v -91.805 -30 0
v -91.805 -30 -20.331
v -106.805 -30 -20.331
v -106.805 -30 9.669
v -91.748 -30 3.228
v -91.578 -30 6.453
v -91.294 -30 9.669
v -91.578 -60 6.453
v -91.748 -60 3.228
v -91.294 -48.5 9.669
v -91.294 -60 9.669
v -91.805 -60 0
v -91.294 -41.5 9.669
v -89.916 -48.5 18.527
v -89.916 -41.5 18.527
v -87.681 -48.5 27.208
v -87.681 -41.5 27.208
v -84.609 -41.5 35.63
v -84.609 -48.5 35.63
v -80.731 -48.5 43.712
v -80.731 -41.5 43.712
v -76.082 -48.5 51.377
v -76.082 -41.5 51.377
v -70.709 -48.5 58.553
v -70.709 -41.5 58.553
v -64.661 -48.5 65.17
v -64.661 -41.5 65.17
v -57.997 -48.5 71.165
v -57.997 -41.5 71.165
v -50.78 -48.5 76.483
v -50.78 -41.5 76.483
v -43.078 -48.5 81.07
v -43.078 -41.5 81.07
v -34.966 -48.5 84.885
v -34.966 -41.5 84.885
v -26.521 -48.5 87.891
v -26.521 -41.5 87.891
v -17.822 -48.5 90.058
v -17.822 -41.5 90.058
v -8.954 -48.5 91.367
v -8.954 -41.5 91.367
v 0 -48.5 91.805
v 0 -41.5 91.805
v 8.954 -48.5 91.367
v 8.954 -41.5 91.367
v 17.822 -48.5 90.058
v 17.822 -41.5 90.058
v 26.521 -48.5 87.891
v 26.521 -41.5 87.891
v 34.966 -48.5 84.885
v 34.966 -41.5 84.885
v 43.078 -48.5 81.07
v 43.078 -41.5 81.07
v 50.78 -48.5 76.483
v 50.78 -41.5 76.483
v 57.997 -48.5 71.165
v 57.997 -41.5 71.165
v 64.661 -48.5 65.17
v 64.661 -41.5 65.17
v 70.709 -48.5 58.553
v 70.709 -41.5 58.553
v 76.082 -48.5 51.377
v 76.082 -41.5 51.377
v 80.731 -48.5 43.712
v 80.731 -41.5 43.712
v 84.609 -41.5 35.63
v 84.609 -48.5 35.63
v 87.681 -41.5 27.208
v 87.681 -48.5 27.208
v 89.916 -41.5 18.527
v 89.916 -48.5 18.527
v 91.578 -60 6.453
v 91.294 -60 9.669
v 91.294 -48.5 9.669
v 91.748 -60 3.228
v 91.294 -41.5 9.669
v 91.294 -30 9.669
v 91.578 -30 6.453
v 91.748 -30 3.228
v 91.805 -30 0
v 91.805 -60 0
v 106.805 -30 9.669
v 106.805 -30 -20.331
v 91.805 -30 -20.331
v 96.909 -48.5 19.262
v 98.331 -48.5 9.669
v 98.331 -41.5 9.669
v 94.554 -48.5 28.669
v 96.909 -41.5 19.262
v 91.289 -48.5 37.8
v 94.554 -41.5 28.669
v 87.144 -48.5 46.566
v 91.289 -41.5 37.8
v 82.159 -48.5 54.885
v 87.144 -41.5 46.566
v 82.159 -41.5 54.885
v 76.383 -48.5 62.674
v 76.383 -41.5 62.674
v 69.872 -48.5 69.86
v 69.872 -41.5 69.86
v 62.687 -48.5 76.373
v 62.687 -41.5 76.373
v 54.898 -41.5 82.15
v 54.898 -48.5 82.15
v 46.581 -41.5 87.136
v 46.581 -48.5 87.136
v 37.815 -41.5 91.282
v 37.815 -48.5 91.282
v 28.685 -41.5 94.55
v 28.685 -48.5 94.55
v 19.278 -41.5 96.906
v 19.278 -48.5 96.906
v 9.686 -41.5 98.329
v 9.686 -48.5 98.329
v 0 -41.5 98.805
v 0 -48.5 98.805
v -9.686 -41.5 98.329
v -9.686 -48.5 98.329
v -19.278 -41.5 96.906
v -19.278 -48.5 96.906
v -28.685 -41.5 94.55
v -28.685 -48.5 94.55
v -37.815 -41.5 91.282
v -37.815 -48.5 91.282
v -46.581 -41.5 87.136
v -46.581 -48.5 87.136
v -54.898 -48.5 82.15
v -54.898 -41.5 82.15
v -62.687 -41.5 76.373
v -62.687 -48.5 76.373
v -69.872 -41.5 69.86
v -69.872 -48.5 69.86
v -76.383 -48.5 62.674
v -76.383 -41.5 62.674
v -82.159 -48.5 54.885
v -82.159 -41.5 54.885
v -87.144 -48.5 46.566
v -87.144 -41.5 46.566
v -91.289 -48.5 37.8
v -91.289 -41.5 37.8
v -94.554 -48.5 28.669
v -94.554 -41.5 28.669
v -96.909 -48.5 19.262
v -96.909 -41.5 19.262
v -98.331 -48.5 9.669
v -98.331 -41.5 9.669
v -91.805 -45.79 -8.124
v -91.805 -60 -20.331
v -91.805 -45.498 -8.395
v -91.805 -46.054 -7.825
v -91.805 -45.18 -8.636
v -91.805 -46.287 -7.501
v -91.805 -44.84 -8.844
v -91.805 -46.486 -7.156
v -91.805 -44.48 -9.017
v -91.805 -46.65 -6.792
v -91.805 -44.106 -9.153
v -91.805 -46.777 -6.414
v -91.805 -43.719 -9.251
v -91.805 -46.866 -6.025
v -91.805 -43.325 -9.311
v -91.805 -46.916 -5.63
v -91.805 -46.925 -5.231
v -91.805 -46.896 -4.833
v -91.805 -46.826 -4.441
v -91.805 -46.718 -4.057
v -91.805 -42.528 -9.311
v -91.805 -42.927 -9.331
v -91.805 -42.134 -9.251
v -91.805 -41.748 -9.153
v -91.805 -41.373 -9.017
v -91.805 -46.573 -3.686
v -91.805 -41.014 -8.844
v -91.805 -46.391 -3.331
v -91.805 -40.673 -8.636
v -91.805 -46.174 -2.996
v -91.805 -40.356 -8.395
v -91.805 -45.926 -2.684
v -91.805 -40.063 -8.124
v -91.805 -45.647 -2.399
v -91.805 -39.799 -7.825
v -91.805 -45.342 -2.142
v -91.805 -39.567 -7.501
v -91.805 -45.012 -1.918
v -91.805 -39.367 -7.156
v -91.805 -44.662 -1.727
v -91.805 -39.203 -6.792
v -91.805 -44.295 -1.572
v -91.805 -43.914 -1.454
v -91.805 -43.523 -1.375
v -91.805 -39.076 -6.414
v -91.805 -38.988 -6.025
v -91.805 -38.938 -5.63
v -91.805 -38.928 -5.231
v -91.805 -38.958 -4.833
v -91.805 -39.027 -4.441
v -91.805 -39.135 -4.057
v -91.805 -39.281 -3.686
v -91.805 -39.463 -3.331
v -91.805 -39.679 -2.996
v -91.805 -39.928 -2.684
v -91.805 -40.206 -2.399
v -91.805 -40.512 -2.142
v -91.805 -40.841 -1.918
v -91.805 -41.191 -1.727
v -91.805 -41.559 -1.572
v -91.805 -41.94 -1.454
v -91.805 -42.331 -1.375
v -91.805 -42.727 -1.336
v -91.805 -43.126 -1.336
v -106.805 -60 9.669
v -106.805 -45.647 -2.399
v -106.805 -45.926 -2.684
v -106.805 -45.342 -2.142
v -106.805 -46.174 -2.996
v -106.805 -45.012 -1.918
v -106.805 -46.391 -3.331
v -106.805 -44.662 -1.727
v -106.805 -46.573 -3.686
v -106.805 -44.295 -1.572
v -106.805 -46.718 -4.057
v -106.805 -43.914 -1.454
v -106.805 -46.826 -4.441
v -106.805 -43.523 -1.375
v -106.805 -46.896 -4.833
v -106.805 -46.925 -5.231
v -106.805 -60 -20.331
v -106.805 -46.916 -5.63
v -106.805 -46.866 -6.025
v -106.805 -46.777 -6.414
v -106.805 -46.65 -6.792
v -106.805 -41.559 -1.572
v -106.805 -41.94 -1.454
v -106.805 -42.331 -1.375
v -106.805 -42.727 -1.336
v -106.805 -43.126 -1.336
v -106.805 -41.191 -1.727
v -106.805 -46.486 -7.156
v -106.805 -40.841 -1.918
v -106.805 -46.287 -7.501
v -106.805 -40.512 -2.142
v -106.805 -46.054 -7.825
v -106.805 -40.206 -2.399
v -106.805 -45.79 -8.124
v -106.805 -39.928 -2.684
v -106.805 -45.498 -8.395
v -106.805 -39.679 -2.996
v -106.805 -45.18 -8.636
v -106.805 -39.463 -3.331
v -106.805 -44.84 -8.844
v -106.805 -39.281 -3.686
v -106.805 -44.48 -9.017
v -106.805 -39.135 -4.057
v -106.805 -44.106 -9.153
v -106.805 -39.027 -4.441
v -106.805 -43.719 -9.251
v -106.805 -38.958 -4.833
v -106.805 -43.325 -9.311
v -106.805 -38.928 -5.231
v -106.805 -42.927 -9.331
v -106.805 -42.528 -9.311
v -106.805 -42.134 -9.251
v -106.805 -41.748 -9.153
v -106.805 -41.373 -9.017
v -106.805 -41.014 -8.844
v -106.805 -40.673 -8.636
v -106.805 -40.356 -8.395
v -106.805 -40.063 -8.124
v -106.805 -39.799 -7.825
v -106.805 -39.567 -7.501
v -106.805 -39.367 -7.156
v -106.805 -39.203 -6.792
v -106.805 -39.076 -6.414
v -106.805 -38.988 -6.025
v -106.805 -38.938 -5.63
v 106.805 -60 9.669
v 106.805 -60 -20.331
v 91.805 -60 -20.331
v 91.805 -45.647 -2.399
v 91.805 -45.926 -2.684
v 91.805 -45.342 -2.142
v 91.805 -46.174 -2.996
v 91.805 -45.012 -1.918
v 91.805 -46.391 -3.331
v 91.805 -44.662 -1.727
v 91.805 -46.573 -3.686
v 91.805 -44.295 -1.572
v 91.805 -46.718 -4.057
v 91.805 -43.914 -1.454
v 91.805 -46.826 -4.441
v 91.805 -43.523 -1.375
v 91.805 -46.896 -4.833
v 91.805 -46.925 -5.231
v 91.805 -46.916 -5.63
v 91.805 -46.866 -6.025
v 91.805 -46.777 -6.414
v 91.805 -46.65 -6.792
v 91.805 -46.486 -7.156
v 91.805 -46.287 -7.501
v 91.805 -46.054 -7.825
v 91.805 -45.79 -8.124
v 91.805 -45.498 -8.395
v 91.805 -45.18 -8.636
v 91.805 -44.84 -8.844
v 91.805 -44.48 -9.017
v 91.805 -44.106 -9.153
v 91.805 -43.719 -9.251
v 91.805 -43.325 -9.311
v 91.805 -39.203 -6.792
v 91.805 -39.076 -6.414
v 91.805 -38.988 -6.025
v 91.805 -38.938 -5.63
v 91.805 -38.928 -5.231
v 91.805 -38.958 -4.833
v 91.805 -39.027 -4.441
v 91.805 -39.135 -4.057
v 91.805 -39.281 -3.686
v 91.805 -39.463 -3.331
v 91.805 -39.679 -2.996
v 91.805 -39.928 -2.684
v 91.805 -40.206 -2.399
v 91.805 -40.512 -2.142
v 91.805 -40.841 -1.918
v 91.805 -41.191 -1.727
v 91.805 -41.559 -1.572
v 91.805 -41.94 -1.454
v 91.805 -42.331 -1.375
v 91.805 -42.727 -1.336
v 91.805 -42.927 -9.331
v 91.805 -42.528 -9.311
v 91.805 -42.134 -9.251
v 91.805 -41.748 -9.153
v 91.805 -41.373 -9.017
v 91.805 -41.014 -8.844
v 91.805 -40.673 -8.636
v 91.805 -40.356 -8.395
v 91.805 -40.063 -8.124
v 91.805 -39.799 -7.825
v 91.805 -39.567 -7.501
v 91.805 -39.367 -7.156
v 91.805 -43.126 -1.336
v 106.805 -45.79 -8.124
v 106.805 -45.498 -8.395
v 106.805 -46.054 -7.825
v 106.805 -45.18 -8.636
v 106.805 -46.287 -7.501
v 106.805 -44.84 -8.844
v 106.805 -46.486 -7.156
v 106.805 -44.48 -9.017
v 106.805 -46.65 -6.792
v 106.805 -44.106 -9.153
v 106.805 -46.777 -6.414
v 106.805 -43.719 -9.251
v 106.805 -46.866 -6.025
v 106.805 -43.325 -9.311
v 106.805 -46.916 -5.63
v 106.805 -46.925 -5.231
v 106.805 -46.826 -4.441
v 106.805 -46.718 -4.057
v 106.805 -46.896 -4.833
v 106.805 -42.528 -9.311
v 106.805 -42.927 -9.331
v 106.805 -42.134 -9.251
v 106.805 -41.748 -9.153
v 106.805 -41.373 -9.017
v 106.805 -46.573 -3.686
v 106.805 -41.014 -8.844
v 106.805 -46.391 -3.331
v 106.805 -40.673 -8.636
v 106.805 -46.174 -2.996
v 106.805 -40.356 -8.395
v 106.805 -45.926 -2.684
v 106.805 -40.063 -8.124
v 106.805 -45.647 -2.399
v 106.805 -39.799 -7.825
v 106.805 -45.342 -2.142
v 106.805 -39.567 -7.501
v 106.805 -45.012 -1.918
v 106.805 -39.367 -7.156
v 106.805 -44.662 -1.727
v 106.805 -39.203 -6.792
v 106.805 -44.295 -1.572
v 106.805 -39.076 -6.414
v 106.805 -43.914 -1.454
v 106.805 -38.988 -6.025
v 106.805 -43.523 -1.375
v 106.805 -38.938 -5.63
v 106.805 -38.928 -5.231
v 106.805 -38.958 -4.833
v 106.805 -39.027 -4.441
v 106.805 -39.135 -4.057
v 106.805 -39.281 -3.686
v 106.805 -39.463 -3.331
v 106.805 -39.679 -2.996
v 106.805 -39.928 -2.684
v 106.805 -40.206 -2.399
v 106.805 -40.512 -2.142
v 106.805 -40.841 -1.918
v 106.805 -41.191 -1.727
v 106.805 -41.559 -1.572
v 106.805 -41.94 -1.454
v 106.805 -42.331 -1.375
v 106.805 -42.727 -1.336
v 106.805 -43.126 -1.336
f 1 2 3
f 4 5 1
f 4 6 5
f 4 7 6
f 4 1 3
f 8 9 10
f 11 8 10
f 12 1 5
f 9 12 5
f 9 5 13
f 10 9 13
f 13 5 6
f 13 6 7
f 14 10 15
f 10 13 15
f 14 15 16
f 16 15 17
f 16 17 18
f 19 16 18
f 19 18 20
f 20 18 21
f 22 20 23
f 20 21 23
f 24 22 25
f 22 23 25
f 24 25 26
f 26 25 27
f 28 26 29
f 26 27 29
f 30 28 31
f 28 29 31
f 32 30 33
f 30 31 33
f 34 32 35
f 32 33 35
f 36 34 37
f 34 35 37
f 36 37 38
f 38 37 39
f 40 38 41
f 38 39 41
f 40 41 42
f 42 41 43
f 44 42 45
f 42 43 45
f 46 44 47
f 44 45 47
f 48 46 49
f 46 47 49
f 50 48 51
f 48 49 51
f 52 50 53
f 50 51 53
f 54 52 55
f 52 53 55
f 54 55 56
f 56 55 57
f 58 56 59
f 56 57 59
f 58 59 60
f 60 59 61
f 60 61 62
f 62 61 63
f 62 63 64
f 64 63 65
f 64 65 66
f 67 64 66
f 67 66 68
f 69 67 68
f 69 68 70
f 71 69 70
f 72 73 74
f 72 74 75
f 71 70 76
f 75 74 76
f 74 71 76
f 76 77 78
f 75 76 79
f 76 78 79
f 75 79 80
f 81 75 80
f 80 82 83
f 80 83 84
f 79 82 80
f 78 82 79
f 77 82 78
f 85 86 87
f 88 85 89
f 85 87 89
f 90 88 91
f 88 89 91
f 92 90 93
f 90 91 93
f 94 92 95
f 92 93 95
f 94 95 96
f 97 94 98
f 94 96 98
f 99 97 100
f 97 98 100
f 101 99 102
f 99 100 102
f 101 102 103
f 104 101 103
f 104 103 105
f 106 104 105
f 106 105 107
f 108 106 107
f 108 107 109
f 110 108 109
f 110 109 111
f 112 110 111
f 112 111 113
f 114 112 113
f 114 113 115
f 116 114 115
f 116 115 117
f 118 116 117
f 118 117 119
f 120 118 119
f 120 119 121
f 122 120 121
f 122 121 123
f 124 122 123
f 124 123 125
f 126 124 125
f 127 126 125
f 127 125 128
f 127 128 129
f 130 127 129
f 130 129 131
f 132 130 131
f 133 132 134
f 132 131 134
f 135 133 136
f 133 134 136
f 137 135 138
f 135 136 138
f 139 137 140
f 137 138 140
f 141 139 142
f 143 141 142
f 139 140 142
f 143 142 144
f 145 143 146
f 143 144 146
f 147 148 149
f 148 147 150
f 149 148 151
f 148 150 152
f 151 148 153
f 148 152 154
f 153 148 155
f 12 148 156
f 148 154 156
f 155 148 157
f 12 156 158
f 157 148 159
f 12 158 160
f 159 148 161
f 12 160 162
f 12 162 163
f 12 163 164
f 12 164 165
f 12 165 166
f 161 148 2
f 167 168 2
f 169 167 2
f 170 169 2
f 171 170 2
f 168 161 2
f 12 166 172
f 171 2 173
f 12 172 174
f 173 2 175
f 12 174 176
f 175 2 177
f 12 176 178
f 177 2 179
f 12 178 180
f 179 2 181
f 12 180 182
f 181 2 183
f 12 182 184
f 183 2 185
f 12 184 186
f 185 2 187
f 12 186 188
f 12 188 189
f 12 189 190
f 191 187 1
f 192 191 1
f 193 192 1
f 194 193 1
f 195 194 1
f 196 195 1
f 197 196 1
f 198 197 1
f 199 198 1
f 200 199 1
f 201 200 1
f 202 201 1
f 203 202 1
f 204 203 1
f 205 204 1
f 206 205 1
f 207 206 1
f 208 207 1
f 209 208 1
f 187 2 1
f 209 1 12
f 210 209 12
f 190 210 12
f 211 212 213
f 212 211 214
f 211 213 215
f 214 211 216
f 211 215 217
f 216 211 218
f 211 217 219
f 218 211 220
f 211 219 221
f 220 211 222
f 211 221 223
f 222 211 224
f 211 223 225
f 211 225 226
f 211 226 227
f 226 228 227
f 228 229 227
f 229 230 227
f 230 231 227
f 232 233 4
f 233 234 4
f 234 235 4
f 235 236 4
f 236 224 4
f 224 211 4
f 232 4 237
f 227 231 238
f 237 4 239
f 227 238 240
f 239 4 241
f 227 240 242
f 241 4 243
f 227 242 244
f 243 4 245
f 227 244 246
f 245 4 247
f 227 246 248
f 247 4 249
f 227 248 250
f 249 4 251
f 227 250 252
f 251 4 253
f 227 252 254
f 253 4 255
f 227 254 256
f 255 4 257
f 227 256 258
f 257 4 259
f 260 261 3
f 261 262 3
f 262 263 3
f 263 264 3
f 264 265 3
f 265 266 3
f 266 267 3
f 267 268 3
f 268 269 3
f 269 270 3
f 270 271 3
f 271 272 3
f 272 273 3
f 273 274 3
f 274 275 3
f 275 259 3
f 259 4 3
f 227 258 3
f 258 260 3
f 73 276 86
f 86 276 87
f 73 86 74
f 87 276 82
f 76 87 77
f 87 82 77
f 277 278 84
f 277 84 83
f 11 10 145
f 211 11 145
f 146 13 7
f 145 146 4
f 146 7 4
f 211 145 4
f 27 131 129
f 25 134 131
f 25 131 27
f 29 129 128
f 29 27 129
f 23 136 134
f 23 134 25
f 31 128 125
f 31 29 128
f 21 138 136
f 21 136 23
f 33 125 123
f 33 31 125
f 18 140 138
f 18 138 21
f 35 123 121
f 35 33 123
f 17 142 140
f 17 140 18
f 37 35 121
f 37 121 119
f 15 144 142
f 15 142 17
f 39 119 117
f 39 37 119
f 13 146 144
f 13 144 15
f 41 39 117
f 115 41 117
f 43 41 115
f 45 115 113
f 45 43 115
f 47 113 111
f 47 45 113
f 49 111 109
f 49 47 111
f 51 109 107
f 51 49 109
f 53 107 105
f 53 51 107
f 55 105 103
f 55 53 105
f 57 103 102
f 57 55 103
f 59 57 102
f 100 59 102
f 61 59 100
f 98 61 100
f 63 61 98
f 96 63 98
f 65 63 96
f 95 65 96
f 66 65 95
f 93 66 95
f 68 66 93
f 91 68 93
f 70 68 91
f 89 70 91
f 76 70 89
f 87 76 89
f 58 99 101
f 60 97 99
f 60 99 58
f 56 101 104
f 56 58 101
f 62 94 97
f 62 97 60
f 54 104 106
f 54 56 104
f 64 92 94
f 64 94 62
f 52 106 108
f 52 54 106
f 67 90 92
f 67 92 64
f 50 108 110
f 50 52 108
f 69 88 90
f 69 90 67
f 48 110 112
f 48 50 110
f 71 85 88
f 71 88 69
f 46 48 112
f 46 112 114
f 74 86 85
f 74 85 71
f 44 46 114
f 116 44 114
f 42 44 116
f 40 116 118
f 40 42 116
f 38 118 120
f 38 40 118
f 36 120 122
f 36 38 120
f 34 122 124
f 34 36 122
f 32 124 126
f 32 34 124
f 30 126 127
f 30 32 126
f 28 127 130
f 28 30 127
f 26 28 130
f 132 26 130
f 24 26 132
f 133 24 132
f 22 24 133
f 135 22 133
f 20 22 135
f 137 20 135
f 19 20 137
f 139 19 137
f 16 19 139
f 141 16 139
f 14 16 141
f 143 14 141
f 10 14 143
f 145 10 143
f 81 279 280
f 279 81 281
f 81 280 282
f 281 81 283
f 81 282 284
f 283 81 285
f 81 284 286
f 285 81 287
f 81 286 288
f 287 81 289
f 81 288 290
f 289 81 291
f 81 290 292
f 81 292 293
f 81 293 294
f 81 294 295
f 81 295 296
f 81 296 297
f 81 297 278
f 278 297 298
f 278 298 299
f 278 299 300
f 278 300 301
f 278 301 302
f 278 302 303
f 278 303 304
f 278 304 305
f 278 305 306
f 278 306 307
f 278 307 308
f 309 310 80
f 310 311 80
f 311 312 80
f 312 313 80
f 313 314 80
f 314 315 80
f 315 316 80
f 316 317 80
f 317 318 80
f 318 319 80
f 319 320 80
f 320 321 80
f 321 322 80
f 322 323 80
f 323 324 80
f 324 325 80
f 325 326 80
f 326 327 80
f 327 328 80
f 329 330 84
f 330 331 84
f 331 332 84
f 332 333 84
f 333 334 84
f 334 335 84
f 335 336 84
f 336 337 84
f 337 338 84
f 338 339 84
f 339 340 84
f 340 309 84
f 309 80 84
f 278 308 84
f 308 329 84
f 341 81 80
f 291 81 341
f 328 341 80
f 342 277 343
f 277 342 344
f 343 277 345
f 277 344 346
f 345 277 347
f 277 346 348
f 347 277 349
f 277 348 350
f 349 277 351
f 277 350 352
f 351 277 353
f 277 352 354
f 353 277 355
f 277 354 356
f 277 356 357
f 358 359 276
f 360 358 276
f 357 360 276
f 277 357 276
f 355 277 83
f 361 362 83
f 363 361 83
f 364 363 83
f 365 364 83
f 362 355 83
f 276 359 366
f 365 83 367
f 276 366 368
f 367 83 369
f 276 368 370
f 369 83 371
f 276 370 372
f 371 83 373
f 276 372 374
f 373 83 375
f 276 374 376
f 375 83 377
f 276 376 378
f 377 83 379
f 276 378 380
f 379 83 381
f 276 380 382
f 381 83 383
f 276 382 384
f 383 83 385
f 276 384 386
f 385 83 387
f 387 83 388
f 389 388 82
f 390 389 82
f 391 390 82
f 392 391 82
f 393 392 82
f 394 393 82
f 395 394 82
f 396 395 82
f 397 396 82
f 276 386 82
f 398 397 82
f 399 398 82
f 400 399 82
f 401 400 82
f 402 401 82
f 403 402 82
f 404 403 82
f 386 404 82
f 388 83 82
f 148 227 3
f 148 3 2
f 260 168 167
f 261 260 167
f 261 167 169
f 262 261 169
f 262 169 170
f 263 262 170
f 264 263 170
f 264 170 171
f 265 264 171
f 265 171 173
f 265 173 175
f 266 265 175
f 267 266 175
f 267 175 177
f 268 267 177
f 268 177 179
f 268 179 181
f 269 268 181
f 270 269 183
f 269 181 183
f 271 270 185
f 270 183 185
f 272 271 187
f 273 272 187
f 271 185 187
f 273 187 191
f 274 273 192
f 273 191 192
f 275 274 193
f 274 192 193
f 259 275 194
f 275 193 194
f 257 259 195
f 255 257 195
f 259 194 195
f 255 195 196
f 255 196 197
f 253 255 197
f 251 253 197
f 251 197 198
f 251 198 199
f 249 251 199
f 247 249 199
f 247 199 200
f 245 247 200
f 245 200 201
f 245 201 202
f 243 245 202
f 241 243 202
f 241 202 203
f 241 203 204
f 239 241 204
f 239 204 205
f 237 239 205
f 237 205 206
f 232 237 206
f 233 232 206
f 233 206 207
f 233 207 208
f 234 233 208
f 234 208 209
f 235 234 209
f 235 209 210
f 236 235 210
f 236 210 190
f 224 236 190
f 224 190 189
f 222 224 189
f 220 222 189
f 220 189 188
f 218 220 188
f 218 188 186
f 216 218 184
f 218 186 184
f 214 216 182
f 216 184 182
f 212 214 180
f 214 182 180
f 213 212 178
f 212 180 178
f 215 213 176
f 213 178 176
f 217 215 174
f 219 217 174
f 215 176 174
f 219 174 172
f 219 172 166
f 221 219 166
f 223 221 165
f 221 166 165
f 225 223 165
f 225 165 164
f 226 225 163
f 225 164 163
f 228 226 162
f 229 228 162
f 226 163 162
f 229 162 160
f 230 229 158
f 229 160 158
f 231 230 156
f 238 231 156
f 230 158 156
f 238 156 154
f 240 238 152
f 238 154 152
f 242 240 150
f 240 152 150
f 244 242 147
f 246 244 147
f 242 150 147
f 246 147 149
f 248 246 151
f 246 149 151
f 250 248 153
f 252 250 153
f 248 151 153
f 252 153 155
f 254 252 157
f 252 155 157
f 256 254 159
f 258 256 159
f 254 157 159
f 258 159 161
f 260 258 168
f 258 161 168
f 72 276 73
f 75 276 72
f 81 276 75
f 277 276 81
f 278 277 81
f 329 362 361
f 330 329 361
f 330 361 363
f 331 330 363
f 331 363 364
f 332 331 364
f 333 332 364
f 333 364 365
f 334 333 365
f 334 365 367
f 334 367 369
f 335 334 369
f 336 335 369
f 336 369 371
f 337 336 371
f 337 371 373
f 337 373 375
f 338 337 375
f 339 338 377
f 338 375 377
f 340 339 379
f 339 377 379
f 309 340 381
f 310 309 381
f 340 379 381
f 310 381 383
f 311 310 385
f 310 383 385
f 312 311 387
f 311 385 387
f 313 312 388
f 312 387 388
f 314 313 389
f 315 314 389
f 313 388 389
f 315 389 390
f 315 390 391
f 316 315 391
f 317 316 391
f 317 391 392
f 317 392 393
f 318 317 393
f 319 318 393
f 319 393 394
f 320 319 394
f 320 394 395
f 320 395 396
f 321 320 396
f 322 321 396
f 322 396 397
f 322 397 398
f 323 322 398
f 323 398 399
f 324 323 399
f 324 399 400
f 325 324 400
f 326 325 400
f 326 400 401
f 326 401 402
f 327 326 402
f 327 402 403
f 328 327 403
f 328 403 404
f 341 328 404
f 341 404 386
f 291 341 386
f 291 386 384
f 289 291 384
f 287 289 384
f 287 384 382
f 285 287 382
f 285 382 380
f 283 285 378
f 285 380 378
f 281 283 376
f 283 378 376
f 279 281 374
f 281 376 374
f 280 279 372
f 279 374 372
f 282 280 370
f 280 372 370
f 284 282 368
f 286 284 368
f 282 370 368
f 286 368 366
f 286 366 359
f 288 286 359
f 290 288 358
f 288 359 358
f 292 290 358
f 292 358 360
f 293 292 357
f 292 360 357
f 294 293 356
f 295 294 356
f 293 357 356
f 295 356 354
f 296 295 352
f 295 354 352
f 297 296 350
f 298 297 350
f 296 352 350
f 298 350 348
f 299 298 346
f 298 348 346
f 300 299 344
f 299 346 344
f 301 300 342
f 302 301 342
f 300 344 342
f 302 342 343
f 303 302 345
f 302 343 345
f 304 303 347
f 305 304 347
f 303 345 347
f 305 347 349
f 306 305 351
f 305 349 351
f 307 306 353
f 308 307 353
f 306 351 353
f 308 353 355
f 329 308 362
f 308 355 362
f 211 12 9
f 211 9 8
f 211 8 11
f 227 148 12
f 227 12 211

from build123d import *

# Parameters (mm, degrees)
BOSS_EXTRUDE1_DEPTH      = 60
CUT_EXTRUDE19_DEPTH      = 171.881965709
CUT_EXTRUDE19_DEPTH_BACK = 171.881965709
SKETCH30_W               = 213.61
SKETCH30_H               = 30
SKETCH31_R               = 4
CUT_EXTRUDE20_DEPTH      = 243.881988062
CUT_EXTRUDE21_DEPTH      = 11.5
CUT_EXTRUDE22_START      = -11.5
CUT_EXTRUDE22_DEPTH      = 11.5


with BuildPart() as part:
    # Sketch1 → Boss-Extrude1 (new body)
    with BuildSketch(Plane(origin=(0, 0, 0), x_dir=(1, 0, 0), z_dir=(0, 1, 0))):
        with BuildLine():
            Line((106.805, -9.669202779), (98.330740578, -9.669202779))
            ThreePointArc((98.330740578, -9.669202779), (0, -98.805), (-98.330740578, -9.669202779))
            Line((-98.330740578, -9.669202779), (-106.805, -9.669202779))
            Line((-106.805, -9.669202779), (-106.805, 20.330797221))
            Line((-106.805, 20.330797221), (-91.805, 20.330797221))
            Line((-91.805, 20.330797221), (-91.805, 0))
            ThreePointArc((-91.805, 0), (0, -91.805), (91.805, 0))
            Line((91.805, 0), (91.805, 20.330797221))
            Line((91.805, 20.330797221), (106.805, 20.330797221))
            Line((106.805, 20.330797221), (106.805, -9.669202779))
        make_face()
    extrude(amount=-BOSS_EXTRUDE1_DEPTH)

    # Sketch30 → Cut-Extrude19 (cut, two sides: drawn at the far end of the back side and taken through both)
    with BuildSketch(Plane(origin=(0, 0, -20.330797221), x_dir=(-1, 0, 0), z_dir=(0, 0, -1)).offset(-CUT_EXTRUDE19_DEPTH_BACK)):
        with Locations((0, -15)):
            Rectangle(SKETCH30_W, SKETCH30_H)
    extrude(amount=CUT_EXTRUDE19_DEPTH + CUT_EXTRUDE19_DEPTH_BACK, mode=Mode.SUBTRACT)

    # Sketch31 → Cut-Extrude20 (cut, through all)
    with BuildSketch(Plane(origin=(106.805, 0, 0), x_dir=(0, 0, -1), z_dir=(1, 0, 0))):
        with Locations((5.330797221, -42.92674227)):
            Circle(SKETCH31_R)
    extrude(amount=-CUT_EXTRUDE20_DEPTH, mode=Mode.SUBTRACT)

    # Sketch32 → Cut-Extrude21 (cut)
    with BuildSketch(Plane(origin=(0, -30, 0), x_dir=(1, 0, 0), z_dir=(0, 1, 0))):
        with BuildLine():
            Line((98.330740578, -9.669202779), (-98.330740578, -9.669202779))
            ThreePointArc((-98.330740578, -9.669202779), (0, -98.805), (98.330740578, -9.669202779))
        make_face()
    extrude(amount=-CUT_EXTRUDE21_DEPTH, mode=Mode.SUBTRACT)

    # Sketch33 → Cut-Extrude22 (cut)
    with BuildSketch(Plane(origin=(0, -60, 0), x_dir=(-1, 0, 0), z_dir=(0, -1, 0)).offset(CUT_EXTRUDE22_START)):
        with BuildLine():
            Line((98.330740578, -9.669202779), (-98.330740578, -9.669202779))
            ThreePointArc((-98.330740578, -9.669202779), (0, -98.805), (98.330740578, -9.669202779))
        make_face()
    extrude(amount=CUT_EXTRUDE22_DEPTH, mode=Mode.SUBTRACT)


solid = part.part
